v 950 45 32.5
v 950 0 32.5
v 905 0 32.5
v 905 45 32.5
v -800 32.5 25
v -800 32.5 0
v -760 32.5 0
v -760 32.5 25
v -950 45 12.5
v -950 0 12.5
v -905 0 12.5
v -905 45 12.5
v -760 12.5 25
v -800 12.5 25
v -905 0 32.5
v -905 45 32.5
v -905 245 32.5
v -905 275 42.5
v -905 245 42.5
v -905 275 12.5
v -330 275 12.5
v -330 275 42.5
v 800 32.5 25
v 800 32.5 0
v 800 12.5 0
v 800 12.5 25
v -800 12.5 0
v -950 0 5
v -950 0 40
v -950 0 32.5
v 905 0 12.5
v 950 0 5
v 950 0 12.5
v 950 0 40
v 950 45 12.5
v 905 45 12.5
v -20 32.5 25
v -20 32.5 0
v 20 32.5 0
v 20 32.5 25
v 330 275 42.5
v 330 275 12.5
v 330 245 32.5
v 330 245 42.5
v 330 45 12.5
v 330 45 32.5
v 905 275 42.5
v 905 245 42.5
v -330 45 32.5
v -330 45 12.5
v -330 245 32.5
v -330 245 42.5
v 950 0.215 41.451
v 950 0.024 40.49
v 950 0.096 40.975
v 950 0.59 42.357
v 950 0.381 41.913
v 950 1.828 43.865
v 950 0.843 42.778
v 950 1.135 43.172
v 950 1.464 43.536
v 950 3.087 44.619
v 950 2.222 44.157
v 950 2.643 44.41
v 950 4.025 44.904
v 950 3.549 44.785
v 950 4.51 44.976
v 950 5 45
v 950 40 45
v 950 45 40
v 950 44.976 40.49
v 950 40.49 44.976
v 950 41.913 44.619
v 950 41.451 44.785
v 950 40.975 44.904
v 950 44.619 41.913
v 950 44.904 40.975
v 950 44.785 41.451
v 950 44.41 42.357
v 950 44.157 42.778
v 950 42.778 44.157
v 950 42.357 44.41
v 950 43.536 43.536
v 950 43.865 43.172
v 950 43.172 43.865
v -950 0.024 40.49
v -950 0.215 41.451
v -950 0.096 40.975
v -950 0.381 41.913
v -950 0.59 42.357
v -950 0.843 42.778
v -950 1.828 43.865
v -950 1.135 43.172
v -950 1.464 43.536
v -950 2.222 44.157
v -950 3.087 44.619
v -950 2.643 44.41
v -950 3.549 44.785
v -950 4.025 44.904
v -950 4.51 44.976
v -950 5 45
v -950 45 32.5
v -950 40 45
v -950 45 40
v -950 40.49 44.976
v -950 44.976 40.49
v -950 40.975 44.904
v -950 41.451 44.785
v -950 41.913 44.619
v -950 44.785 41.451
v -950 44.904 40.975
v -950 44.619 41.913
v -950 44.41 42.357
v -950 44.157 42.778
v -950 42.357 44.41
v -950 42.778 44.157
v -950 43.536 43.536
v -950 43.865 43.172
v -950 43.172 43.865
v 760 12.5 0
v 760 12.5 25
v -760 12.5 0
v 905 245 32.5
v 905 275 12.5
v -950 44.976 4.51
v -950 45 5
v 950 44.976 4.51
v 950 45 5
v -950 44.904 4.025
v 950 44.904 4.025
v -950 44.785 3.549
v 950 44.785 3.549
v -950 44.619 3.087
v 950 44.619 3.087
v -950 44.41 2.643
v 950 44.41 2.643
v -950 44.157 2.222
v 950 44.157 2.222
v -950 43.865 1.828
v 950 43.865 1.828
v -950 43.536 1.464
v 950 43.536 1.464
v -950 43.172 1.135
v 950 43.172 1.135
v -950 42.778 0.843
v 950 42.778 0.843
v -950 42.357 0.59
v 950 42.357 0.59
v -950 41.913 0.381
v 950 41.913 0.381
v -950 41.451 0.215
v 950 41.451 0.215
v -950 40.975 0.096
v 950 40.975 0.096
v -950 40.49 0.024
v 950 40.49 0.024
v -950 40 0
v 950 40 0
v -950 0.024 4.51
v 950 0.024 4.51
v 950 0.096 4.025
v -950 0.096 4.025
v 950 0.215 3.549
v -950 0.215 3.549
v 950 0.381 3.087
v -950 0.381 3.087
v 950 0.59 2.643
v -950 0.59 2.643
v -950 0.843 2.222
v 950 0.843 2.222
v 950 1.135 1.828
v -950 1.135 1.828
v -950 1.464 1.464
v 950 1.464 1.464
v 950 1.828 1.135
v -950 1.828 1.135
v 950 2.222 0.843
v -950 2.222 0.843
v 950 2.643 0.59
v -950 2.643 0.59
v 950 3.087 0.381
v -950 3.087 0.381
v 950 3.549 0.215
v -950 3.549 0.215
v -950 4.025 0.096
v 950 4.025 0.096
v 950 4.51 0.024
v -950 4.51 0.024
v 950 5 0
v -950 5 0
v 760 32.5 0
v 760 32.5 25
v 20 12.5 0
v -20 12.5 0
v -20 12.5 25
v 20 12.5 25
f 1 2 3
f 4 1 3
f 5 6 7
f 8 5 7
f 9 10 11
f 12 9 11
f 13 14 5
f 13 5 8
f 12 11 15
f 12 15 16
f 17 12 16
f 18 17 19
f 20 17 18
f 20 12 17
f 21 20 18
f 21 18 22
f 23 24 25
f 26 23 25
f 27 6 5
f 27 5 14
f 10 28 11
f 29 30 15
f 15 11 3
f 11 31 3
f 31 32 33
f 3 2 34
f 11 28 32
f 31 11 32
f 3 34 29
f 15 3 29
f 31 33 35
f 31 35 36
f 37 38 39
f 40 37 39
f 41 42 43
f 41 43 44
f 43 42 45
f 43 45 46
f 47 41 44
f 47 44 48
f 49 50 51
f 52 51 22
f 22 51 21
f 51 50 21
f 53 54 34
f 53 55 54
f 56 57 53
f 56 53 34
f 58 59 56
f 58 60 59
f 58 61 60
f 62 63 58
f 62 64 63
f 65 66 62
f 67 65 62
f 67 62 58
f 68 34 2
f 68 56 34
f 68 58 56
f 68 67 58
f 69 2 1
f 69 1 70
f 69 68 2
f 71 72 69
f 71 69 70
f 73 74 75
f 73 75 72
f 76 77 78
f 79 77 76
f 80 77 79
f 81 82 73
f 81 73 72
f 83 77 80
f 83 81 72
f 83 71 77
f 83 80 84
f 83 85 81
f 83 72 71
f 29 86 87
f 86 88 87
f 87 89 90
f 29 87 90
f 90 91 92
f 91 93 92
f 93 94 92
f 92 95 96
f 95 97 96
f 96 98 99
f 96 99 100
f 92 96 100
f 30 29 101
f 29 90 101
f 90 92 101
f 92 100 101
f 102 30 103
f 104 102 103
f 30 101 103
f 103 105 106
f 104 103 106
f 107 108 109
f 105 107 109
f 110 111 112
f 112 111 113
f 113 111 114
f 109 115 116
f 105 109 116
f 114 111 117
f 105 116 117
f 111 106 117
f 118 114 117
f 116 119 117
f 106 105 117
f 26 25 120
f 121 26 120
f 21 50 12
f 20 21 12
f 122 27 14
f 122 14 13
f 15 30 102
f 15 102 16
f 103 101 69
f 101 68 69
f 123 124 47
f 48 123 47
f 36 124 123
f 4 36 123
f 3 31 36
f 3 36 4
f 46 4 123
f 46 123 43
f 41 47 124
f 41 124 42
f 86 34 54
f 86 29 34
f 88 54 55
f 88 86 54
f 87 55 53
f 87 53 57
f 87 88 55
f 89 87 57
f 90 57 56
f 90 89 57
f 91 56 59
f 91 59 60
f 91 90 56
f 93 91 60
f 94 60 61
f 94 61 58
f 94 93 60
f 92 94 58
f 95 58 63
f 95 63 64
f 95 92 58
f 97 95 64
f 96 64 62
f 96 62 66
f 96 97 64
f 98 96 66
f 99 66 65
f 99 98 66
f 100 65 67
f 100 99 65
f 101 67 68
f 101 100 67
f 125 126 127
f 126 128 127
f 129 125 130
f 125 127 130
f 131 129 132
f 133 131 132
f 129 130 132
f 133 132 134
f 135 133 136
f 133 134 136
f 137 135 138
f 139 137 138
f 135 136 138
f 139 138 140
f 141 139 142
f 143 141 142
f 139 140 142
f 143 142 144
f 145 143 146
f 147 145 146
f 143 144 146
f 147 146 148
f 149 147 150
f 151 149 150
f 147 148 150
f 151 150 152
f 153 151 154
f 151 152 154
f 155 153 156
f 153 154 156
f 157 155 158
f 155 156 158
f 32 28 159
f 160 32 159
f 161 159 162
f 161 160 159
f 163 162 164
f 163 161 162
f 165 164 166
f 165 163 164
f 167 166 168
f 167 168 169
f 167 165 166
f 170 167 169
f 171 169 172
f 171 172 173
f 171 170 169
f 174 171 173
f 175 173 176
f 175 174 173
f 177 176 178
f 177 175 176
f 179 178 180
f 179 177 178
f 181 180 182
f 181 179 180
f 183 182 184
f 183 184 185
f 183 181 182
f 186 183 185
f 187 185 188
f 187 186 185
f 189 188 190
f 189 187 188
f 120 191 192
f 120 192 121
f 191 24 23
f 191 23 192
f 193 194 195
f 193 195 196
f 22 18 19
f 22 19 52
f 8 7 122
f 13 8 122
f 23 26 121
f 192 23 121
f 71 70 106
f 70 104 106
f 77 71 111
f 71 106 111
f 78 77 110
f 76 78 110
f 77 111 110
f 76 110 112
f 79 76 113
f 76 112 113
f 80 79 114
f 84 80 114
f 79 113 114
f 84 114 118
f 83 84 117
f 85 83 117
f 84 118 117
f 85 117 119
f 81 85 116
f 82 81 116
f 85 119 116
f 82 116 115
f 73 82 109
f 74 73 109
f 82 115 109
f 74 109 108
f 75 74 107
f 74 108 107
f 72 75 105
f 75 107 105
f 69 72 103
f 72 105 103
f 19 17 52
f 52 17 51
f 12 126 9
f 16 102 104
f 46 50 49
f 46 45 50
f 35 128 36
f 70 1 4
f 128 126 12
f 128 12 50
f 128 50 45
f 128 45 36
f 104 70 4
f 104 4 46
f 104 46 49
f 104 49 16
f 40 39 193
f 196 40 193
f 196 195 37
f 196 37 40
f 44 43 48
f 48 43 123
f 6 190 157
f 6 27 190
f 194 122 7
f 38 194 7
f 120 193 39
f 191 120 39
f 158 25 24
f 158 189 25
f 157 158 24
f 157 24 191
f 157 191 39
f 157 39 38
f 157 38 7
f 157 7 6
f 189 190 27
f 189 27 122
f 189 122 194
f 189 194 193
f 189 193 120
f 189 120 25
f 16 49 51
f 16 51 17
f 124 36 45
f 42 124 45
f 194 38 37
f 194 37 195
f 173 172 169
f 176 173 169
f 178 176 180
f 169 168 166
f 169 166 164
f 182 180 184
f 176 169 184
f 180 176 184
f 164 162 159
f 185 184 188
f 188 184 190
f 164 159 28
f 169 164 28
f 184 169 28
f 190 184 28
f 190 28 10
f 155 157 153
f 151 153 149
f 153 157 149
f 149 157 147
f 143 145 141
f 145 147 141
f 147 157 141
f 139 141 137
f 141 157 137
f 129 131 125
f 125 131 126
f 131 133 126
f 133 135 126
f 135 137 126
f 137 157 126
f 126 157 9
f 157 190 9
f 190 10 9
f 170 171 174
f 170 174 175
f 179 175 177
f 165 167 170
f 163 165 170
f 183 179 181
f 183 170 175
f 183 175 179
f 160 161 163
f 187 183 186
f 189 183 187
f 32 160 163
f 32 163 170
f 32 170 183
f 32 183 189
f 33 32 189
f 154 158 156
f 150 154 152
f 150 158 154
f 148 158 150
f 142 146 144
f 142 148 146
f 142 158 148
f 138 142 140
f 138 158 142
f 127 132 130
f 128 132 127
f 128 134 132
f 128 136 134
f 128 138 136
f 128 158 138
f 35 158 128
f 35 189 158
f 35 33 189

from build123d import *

# Parameters (mm, degrees)
F0_W      = 45
F0_H      = 45
F1_DEPTH  = 950
F2_R      = 5
F3_W      = 45
F3_H      = 20
F4_DEPTH  = 45.001
F5_W      = 40
F5_H      = 20
F6_DEPTH  = 25
F7_W      = 40
F7_H      = 20
F8_DEPTH  = 25
F9_W      = 575
F9_H      = 20
F10_DEPTH = 230
F11_W     = 575
F11_H     = 30
F12_DEPTH = 10


# Not quite as in the source:
# - a pattern or mirror of a feature is missing from the dataset's text; its kind, count and spacing are read off the source's solid


with BuildPart() as f1:
    # F0 (on Right) → F1 (new body, symmetric)
    with BuildSketch(Plane.YZ):
        with Locations((22.5, 22.5)):
            Rectangle(F0_W, F0_H)
    extrude(amount=F1_DEPTH, both=True)

    # F2
    f2_edges = [f1.edges().sort_by_distance(p)[0] for p in [
        (0, 0, 45),
        (0, 45, 45),
        (0, 0, 0),
        (0, 45, 0),
    ]]
    fillet(f2_edges, radius=F2_R)

    # F3 (on face) → F4 (cut, through all)
    with BuildSketch(Plane.XZ):
        with Locations((-927.5, 22.5)):
            Rectangle(F3_W, F3_H)
    f4 = extrude(amount=-F4_DEPTH, mode=Mode.SUBTRACT)

    # F4_copies: F4 across plane
    add(f4.mirror(Plane(origin=(0, 0, 0), x_dir=(0, 0, 1), z_dir=(1, 0, 0))), mode=Mode.SUBTRACT)

    # F5 (on face) → F6 (cut)
    with BuildSketch(Plane(origin=(0, 0, 0), x_dir=(1, 0, 0), z_dir=(0, 0, -1))):
        with Locations((-780, -22.5)):
            Rectangle(F5_W, F5_H)
    f6 = extrude(amount=-F6_DEPTH, mode=Mode.SUBTRACT)

    # F6_copies: F6 across plane
    add(f6.mirror(Plane(origin=(0, 0, 0), x_dir=(0, 0, 1), z_dir=(1, 0, 0))), mode=Mode.SUBTRACT)

    # F7 (on face) → F8 (cut)
    with BuildSketch(Plane(origin=(0, 0, 0), x_dir=(1, 0, 0), z_dir=(0, 0, -1))):
        with Locations((0, -22.5)):
            Rectangle(F7_W, F7_H)
    extrude(amount=-F8_DEPTH, mode=Mode.SUBTRACT)

    # F9 (on face) → F10 (join)
    with BuildSketch(Plane(origin=(0, 45, 0), x_dir=(-1, 0, 0), z_dir=(0, 1, 0))):
        with Locations((-617.5, 22.5)):
            Rectangle(F9_W, F9_H)
        with Locations((617.5, 22.5)):
            Rectangle(F9_W, F9_H)
    extrude(amount=F10_DEPTH)

    # F11 (on face) → F12 (join)
    with BuildSketch(Plane.XY.offset(32.5)):
        with Locations((-617.5, 260)):
            Rectangle(F11_W, F11_H)
        with Locations((617.5, 260)):
            Rectangle(F11_W, F11_H)
    extrude(amount=F12_DEPTH)


solid = f1.part
